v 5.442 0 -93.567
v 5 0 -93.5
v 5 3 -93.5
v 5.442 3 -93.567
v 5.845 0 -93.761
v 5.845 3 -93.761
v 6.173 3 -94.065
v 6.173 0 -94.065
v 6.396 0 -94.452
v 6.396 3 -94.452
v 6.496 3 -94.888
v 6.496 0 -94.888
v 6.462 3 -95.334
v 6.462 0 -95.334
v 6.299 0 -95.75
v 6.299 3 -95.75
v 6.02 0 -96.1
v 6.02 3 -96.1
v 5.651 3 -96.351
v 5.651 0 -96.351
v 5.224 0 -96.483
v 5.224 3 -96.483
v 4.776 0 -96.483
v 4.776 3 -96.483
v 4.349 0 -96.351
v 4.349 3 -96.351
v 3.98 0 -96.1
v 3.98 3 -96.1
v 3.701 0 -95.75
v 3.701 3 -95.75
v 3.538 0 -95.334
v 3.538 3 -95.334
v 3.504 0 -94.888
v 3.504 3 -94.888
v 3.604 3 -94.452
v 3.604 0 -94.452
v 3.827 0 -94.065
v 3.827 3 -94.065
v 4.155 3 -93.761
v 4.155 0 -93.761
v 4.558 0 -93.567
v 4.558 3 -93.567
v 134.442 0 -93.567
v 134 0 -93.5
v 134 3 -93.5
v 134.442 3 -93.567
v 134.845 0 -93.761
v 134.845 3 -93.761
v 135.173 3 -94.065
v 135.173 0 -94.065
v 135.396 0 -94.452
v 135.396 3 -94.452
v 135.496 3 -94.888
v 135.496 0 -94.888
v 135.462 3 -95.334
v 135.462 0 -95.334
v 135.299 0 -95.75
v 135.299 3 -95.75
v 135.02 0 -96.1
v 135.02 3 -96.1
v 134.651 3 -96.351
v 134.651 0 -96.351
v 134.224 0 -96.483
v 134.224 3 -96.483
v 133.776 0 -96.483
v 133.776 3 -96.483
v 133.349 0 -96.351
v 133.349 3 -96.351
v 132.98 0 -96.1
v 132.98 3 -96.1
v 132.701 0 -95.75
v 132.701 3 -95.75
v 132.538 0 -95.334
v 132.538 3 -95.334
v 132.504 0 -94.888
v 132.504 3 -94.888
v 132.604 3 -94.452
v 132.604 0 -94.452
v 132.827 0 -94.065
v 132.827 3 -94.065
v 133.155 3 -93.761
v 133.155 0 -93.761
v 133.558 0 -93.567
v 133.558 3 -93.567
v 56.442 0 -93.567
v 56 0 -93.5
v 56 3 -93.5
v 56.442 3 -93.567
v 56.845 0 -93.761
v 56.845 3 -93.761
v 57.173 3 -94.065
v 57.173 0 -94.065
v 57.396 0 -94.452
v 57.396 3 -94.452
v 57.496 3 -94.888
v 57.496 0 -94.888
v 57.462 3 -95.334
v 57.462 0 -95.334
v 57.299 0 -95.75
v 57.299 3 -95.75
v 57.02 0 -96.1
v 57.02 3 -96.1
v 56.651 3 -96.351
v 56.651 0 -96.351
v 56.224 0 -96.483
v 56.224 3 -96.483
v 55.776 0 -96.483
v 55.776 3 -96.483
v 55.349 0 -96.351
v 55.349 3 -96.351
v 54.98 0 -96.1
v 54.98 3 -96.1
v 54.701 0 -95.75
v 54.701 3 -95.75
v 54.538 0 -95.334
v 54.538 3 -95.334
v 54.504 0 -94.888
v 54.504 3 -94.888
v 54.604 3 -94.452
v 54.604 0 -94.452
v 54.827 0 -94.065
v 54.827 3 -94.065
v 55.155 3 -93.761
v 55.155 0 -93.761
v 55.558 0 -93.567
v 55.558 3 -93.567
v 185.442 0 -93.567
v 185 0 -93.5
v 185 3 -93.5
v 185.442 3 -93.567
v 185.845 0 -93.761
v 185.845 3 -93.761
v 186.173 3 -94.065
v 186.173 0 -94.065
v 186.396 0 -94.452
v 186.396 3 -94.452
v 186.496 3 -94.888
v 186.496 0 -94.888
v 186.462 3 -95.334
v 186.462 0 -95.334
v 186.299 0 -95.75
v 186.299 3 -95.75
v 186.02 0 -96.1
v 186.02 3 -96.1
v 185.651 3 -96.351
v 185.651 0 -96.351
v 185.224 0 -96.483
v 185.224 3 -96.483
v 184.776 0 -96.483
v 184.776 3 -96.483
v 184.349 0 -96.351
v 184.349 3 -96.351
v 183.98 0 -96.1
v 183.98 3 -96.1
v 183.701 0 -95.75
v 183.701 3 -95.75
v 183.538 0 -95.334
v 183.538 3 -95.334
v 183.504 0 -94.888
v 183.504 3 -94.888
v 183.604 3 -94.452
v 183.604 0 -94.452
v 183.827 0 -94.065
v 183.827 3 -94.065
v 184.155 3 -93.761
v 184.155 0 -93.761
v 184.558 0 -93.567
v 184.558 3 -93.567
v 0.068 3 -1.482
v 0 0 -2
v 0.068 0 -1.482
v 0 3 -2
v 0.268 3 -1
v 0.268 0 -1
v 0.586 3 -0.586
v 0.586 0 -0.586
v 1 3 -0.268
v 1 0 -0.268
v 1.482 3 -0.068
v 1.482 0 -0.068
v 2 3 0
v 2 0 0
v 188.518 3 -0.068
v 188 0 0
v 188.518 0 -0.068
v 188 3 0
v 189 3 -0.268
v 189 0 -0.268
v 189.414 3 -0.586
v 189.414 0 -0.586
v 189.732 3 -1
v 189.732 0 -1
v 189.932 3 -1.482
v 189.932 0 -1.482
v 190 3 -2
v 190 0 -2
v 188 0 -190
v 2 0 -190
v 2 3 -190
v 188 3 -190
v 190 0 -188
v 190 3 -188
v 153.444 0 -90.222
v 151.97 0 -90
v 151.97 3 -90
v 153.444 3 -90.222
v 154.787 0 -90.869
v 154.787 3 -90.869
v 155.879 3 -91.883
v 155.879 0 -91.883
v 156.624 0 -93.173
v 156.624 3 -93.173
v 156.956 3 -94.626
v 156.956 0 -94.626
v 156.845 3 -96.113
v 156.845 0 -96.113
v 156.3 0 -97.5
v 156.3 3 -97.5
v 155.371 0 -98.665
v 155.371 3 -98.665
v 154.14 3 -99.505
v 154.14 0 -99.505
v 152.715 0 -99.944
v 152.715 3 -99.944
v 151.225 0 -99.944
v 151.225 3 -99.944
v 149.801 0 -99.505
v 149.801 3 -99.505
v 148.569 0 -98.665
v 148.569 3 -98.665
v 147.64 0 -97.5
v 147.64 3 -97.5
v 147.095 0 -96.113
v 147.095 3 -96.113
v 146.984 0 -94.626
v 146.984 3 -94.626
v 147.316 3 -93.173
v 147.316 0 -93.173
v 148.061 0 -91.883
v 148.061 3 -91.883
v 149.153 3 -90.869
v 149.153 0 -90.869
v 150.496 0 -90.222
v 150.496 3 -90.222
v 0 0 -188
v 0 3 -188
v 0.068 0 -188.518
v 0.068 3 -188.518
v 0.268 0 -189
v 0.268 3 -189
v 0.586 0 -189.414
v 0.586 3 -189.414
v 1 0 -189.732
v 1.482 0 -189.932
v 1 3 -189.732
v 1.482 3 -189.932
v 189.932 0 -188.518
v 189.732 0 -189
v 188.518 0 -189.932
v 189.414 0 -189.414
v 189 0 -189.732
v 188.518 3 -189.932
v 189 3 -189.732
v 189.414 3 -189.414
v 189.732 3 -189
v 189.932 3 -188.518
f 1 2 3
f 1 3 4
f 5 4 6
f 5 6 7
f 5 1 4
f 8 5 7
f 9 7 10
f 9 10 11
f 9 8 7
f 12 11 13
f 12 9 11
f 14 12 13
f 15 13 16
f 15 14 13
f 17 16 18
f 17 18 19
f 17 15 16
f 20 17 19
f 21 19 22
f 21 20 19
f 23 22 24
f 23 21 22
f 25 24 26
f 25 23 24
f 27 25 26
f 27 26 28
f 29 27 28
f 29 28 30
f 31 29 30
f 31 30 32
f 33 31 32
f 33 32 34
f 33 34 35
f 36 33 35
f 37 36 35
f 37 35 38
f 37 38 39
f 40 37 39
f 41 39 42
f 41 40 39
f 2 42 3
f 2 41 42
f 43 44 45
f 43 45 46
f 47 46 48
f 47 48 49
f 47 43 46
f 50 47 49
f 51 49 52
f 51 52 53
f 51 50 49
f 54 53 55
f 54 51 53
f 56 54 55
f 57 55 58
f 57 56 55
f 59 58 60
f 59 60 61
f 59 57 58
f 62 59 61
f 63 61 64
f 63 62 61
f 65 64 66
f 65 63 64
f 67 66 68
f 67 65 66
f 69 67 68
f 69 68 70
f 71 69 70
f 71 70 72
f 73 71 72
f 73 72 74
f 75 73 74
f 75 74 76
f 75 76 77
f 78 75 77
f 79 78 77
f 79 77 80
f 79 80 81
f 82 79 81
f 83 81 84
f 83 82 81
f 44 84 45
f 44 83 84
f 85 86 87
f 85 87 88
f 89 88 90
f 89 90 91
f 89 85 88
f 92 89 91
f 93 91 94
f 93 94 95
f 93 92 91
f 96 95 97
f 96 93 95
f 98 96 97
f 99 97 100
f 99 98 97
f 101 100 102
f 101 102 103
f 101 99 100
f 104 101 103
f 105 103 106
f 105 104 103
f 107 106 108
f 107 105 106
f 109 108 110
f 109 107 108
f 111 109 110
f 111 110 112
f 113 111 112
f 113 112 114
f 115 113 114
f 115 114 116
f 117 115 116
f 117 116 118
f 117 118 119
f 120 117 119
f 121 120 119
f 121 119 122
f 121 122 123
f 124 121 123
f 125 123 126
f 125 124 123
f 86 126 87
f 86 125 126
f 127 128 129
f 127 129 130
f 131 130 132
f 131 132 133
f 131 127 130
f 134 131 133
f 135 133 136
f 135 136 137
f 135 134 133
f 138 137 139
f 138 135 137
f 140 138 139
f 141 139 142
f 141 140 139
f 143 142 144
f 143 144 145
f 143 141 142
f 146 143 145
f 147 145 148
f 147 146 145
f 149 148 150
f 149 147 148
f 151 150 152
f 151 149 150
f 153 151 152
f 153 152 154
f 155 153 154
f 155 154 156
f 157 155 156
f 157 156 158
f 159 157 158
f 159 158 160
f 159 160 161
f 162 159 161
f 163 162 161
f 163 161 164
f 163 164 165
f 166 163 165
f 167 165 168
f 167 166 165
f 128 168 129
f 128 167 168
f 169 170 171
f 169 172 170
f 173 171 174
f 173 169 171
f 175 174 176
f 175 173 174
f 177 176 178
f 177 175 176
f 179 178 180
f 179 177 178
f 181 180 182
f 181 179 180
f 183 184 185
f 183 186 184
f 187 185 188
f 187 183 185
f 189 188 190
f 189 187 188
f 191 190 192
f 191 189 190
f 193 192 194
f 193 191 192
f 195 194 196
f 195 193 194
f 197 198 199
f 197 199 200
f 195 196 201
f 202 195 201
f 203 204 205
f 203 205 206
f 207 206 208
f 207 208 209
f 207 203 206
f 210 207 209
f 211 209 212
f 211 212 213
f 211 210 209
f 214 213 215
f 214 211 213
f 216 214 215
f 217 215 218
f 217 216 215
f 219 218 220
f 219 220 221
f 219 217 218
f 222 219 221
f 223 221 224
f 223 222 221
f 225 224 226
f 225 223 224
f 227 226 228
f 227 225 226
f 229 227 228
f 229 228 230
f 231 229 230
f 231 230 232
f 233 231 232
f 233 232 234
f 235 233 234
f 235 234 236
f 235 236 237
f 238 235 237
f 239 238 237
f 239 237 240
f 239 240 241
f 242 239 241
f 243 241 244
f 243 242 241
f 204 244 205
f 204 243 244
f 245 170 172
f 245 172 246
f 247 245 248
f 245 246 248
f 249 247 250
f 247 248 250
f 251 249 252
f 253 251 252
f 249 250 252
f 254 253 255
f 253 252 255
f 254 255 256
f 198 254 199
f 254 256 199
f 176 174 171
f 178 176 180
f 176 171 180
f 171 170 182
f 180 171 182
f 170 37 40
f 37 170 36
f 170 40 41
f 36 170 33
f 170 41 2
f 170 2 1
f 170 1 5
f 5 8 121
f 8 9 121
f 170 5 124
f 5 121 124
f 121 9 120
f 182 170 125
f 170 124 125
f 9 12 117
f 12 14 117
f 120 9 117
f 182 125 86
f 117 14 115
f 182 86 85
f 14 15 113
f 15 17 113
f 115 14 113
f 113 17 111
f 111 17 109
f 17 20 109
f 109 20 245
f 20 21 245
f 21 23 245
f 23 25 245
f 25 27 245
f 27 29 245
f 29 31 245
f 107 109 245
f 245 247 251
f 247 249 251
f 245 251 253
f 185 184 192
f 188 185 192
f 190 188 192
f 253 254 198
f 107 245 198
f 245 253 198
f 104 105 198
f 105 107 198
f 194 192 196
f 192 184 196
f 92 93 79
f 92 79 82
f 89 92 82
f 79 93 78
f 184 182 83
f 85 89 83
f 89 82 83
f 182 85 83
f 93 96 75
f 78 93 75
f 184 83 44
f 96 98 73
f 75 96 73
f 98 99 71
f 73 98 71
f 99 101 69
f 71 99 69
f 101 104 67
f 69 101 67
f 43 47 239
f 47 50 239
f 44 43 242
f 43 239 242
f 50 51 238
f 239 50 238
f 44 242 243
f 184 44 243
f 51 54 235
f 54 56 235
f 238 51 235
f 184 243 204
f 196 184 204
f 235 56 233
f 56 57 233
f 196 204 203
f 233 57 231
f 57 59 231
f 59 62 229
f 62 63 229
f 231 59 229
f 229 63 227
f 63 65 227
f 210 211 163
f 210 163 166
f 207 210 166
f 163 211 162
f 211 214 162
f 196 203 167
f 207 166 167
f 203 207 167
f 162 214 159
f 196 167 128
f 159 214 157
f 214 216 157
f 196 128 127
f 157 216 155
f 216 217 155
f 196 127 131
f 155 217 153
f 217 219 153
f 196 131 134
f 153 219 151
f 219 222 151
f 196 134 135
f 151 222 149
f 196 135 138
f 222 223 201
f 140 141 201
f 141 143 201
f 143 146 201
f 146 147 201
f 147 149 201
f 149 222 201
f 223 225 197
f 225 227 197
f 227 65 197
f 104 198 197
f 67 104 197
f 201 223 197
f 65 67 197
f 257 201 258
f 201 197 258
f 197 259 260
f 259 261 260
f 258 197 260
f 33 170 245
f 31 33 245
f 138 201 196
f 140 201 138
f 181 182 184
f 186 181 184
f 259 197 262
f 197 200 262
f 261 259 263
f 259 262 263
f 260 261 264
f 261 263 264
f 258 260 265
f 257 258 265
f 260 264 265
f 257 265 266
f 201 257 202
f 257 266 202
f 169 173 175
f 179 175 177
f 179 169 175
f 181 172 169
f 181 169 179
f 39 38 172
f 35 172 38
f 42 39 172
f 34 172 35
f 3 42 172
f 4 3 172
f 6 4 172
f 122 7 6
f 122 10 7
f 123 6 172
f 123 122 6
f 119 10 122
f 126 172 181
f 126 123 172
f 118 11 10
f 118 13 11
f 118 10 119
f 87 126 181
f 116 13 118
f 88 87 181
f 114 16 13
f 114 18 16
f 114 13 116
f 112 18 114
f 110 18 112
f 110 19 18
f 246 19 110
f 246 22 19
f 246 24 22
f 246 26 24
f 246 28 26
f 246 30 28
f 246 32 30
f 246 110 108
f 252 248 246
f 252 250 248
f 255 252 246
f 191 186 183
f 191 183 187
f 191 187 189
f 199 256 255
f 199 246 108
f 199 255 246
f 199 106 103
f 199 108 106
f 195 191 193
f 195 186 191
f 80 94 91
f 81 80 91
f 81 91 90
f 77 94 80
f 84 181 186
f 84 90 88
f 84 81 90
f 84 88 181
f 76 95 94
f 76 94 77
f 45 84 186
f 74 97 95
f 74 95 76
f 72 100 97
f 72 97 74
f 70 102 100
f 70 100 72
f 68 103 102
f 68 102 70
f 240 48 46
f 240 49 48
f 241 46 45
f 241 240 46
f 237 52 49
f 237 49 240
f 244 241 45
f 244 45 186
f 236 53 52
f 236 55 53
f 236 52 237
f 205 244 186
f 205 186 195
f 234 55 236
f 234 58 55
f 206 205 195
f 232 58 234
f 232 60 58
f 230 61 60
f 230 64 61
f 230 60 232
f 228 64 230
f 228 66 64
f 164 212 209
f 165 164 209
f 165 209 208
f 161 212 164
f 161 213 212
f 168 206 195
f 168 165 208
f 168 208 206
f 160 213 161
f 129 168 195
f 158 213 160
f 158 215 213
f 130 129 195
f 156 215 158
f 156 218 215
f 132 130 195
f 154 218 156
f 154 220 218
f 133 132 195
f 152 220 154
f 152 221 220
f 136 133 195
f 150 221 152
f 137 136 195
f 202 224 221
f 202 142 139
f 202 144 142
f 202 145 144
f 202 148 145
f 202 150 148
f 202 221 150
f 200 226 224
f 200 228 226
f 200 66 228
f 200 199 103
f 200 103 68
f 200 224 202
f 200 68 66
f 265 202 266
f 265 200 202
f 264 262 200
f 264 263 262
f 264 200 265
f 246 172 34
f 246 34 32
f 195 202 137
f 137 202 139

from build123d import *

# Parameters (mm, degrees)
SKETCH1_W           = 190
SKETCH1_H           = 190
SKETCH1_R           = 1.5
SKETCH1_R_2         = 5
BOSS_EXTRUDE1_DEPTH = 3
FILLET1_R           = 2


with BuildPart() as part:
    # Sketch1 → Boss-Extrude1 (new body)
    with BuildSketch(Plane(origin=(0, 0, 0), x_dir=(1, 0, 0), z_dir=(0, 1, 0))):
        with Locations((95, 95)):
            Rectangle(SKETCH1_W, SKETCH1_H)
        with Locations(Location((185, 95, 0), (0, 0, 270))):
            Circle(SKETCH1_R, mode=Mode.SUBTRACT)
        with Locations(Location((5, 95, 0), (0, 0, 270))):
            Circle(SKETCH1_R, mode=Mode.SUBTRACT)
        with Locations(Location((134, 95, 0), (0, 0, 270))):
            Circle(SKETCH1_R, mode=Mode.SUBTRACT)
        with Locations(Location((56, 95, 0), (0, 0, 270))):
            Circle(SKETCH1_R, mode=Mode.SUBTRACT)
        with Locations(Location((151.970083663, 95, 0), (0, 0, 270))):
            Circle(SKETCH1_R_2, mode=Mode.SUBTRACT)
    extrude(amount=BOSS_EXTRUDE1_DEPTH)

    # Fillet1
    fillet1_edges = [part.edges().sort_by_distance(p)[0] for p in [
        (190, 1.5, -190),
        (190, 1.5, 0),
        (0, 1.5, 0),
        (0, 1.5, -190),
    ]]
    fillet(fillet1_edges, radius=FILLET1_R)


solid = part.part
